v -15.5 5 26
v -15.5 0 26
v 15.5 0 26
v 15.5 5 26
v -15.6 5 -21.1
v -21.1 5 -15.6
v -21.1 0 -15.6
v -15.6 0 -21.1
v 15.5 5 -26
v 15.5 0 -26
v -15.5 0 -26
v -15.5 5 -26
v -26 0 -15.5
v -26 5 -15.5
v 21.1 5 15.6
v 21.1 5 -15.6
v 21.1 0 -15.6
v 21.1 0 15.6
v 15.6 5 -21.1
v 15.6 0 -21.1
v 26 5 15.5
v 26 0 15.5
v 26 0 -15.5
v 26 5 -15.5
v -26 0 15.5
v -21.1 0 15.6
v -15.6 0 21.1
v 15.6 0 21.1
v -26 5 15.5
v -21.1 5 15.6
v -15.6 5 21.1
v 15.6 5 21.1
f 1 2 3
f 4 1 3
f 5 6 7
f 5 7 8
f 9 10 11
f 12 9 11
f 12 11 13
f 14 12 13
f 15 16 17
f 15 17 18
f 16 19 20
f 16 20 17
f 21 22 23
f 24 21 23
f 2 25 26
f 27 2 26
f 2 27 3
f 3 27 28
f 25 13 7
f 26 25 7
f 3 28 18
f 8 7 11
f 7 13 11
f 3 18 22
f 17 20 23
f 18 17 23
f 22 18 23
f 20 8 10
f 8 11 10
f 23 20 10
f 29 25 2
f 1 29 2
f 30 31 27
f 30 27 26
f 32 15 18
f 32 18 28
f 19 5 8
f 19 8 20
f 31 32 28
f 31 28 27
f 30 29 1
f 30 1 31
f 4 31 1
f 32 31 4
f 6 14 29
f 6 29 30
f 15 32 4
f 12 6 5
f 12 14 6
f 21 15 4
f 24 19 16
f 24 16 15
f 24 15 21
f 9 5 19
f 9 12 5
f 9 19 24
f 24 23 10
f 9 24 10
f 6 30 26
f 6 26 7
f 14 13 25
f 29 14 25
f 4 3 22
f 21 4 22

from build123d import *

# Parameters (mm, degrees)
BOSS_EXTRUDE1_DEPTH = 5
CUT_EXTRUDE1_DEPTH  = 5


with BuildPart() as part:
    # Sketch2 → Boss-Extrude1 (new body)
    with BuildSketch(Plane(origin=(0, 0, 0), x_dir=(1, 0, 0), z_dir=(0, 1, 0))):
        Polygon((-15.5, -26), (15.5, -26), (26, -15.5), (26, 15.5), (15.5, 26), (-15.5, 26), (-26, 15.5), (-26, -15.5), align=None)
    extrude(amount=BOSS_EXTRUDE1_DEPTH)

    # Sketch3 → Cut-Extrude1 (cut)
    with BuildSketch(Plane(origin=(0, 5, 0), x_dir=(1, 0, 0), z_dir=(0, 1, 0))):
        Polygon((-21.1, -15.6), (-21.1, 15.6), (-15.6, 21.1), (15.6, 21.1), (21.1, 15.6), (21.1, -15.6), (15.6, -21.1), (-15.6, -21.1), align=None)
    extrude(amount=-CUT_EXTRUDE1_DEPTH, mode=Mode.SUBTRACT)


solid = part.part
